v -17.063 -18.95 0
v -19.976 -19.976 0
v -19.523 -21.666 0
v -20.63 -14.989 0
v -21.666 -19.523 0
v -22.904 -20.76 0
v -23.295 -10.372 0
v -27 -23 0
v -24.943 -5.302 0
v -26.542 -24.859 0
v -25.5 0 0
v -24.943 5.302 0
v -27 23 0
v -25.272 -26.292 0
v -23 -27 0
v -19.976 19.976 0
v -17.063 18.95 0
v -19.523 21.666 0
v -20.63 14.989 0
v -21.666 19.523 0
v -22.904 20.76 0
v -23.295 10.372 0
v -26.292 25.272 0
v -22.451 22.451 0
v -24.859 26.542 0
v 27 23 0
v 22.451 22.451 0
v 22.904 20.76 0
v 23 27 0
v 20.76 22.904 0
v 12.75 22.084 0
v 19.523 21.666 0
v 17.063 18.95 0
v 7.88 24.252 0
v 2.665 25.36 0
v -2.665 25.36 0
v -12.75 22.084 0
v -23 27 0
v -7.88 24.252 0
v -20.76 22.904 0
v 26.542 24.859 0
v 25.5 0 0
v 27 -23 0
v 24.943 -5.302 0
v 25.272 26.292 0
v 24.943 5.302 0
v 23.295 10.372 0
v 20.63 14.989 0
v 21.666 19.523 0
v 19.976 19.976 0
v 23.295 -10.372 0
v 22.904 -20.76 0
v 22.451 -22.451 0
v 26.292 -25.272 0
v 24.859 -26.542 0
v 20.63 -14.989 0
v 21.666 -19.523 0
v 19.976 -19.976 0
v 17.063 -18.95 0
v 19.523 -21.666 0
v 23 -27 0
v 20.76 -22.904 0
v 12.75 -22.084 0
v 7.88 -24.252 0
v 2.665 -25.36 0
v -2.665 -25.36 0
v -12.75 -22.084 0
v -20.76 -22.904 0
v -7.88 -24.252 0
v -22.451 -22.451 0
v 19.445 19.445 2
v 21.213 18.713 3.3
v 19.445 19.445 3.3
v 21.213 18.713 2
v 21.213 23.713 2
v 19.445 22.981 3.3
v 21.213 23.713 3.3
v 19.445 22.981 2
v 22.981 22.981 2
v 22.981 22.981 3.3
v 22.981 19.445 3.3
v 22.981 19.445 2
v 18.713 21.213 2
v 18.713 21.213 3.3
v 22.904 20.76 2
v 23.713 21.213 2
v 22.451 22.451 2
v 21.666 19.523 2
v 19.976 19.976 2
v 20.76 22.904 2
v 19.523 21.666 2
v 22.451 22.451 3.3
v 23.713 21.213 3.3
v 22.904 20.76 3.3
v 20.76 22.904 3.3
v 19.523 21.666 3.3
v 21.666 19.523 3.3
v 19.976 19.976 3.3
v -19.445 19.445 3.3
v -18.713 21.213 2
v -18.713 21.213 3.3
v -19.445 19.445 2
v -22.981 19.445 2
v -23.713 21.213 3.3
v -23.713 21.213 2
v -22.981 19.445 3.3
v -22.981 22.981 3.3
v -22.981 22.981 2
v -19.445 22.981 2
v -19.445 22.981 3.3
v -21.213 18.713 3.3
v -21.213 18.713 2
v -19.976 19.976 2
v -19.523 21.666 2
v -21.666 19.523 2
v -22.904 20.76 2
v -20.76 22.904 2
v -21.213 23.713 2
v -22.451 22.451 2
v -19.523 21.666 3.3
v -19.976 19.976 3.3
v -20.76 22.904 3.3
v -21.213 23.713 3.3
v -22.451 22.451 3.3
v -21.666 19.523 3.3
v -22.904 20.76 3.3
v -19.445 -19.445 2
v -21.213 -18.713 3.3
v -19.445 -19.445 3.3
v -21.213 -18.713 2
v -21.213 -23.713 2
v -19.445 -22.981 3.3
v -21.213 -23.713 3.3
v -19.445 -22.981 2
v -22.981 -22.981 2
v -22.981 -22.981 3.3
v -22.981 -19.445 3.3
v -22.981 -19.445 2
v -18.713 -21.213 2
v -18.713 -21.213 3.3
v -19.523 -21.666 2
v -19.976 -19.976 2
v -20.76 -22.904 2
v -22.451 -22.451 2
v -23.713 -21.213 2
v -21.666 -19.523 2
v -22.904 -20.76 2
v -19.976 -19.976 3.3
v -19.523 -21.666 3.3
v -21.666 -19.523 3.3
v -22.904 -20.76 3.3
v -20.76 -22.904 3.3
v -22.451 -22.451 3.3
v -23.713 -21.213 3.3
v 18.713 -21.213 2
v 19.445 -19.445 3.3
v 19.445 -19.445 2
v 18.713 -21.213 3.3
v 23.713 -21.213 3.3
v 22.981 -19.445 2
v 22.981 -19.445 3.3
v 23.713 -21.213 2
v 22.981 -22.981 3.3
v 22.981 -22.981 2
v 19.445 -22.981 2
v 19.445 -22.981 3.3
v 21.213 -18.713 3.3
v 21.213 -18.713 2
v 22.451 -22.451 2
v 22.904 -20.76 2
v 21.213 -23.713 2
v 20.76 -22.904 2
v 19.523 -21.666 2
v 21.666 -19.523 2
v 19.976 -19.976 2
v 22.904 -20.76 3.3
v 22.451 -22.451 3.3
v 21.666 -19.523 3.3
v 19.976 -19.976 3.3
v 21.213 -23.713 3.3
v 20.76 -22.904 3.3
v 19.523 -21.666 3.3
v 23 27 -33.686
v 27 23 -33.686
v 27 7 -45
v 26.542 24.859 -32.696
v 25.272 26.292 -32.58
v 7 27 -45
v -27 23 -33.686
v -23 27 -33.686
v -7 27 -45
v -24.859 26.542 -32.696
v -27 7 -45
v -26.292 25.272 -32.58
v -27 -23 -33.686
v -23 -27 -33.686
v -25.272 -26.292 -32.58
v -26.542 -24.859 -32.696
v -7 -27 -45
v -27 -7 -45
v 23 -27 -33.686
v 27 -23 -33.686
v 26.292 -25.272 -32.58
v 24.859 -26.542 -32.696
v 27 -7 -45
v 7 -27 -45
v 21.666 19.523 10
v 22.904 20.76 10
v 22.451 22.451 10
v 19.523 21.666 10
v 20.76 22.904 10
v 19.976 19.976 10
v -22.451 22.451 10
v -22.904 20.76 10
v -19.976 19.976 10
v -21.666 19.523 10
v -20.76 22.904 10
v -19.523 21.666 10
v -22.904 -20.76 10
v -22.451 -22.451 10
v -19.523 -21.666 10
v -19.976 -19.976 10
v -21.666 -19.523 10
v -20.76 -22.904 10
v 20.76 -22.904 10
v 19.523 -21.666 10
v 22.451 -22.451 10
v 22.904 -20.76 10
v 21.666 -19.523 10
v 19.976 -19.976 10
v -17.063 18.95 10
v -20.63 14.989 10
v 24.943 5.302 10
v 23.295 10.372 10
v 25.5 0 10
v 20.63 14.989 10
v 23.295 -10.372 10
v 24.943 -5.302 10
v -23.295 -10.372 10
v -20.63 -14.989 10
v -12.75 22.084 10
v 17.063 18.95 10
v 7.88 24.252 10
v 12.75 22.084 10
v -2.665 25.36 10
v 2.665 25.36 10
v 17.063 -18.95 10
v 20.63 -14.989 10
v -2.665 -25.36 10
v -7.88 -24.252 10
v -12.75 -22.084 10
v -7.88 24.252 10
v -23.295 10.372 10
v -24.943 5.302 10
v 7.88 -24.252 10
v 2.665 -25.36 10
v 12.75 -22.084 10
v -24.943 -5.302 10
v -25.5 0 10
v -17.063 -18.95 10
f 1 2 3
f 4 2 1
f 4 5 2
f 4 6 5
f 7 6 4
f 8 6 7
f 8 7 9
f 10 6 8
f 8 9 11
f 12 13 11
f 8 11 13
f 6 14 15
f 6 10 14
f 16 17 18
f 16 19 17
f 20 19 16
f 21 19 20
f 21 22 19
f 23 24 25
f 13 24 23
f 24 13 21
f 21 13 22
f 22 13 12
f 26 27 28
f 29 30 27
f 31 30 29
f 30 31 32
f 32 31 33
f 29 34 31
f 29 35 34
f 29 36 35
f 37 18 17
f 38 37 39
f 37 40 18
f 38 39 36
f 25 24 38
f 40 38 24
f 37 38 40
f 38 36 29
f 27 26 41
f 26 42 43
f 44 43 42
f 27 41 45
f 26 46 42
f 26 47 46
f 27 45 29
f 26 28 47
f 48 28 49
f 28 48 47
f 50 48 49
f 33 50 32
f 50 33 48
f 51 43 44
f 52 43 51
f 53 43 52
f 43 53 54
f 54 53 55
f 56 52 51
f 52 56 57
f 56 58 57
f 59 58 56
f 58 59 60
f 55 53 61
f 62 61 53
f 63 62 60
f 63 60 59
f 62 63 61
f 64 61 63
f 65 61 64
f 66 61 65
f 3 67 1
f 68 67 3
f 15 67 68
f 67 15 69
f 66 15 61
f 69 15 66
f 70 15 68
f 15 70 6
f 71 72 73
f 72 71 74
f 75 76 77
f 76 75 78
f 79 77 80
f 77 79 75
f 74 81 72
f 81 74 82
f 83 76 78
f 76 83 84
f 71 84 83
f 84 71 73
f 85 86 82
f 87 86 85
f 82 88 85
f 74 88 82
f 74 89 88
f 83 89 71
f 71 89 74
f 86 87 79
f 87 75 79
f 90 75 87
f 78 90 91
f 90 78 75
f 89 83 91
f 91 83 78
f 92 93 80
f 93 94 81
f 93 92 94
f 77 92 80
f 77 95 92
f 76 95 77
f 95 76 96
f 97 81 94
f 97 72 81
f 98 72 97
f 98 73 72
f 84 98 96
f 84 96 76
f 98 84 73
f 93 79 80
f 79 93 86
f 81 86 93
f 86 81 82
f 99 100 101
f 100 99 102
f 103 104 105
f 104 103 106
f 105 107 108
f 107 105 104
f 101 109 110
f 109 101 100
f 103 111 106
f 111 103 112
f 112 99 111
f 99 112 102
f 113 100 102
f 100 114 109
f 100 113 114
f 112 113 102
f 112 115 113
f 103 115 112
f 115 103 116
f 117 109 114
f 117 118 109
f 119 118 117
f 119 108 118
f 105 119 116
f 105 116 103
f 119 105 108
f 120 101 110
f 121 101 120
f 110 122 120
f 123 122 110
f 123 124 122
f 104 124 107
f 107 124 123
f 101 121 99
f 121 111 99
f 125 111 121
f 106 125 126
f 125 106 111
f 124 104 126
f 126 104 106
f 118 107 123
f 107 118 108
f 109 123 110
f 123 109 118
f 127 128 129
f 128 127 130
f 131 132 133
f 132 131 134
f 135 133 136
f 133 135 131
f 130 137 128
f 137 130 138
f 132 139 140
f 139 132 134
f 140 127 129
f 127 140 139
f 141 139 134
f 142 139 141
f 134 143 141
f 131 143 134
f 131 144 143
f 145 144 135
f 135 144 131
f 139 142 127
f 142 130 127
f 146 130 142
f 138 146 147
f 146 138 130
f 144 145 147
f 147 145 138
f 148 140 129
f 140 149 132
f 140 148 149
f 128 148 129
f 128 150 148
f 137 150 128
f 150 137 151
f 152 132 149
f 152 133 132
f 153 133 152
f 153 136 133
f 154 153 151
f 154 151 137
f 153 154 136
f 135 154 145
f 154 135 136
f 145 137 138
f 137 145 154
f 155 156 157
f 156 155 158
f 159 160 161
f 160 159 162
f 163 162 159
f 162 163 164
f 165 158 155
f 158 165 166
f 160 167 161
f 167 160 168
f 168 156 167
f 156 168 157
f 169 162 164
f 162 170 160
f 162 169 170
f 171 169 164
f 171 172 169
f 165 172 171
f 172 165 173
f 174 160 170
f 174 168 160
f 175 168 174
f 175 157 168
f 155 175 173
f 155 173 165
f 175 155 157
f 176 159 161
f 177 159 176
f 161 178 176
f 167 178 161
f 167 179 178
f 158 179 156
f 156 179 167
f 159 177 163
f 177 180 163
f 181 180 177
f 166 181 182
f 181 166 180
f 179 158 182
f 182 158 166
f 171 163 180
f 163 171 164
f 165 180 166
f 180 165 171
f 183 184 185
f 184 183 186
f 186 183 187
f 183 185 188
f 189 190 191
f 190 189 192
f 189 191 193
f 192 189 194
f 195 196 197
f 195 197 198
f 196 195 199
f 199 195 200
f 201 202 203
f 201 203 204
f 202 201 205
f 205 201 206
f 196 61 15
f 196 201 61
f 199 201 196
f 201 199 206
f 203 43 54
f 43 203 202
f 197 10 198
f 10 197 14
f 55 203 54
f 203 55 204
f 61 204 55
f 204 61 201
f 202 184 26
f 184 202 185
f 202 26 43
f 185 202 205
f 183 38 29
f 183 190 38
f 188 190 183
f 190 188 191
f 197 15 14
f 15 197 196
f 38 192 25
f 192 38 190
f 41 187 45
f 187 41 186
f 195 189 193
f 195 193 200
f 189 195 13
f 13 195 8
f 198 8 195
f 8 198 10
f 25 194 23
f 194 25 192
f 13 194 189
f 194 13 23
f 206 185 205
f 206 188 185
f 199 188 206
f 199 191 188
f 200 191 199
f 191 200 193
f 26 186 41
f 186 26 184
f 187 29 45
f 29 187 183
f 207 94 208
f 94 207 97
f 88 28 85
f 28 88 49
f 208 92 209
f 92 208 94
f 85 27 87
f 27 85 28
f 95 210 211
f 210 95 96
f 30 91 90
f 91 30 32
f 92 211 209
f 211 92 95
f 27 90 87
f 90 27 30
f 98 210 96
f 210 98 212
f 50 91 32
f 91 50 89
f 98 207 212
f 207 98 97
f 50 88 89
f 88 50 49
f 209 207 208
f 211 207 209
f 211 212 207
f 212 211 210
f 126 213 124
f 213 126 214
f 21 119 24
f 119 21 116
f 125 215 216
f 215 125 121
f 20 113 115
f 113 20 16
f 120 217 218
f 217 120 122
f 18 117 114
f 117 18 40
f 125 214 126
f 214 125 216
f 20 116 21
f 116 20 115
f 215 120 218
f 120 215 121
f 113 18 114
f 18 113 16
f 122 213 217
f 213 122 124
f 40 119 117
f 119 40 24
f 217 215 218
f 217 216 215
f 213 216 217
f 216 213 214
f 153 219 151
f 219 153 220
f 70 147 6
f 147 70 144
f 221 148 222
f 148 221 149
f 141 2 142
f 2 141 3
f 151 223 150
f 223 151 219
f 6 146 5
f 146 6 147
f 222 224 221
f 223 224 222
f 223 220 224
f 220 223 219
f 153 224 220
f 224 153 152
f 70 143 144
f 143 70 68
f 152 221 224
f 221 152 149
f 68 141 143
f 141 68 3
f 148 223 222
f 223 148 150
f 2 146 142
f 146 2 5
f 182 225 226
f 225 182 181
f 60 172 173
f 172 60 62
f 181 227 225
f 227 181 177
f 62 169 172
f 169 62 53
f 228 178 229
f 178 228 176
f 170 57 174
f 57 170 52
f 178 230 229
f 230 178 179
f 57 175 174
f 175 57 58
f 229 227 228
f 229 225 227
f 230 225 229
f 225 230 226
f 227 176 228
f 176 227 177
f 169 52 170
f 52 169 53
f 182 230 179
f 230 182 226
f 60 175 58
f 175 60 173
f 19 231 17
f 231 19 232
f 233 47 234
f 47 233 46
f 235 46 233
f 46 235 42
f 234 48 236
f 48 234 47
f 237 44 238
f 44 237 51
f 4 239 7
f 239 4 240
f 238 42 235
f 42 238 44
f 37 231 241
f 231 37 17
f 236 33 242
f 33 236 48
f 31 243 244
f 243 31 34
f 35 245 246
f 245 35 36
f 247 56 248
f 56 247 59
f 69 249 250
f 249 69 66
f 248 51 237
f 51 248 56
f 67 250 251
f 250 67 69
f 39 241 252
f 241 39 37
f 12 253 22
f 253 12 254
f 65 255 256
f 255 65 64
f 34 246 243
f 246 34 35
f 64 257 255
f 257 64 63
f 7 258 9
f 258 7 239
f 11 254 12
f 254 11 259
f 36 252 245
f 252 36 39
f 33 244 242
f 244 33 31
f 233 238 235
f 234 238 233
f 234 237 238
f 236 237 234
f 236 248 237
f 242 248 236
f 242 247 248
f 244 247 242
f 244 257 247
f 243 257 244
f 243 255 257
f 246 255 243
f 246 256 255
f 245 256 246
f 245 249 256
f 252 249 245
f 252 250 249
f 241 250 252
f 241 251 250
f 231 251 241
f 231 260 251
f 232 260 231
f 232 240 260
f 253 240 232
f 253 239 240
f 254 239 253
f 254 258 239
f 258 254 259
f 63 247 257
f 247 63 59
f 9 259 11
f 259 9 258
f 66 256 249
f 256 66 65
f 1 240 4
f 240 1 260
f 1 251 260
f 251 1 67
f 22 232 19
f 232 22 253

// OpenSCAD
// file: screws.scad
module m3_screw(h=6) {
  color([0.7,0.7,0.7]) {
    cylinder(d=5, h=1.3);
    translate([0, 0, -h])
      cylinder(d=2.7, h=h);
  }
}

module m3_bolt(h=2.5) {
  color([0.7,0.7,0.7]) translate([0, 0, -h]) cylinder(d=5, h=h, $fn=6);
}

module m3_washer() {
  color([0.7,0.7,0.7]) translate([0, 0, -0.5/2]) {
    difference() {
      cylinder(d=7, h=0.5, center=true);
      cylinder(d=3.2, h=1, center=true);
    }
  }
}
// file: utils.scad
module rounded_square(size=1, center=false, r=1) {
  offset(r)
    offset(-r)
      square(size, center=center);
}

module chamfered_pocket(size=1, h=1) {
  intersection() {
    hull() {
      translate([0,0,h/2])
        cube([size.x, size.y, h], center=true);

      translate([0,0,1.5*h])
        cube([size.x+h*2, size.y+h*2, h], center=true);
    }
    translate([0,0,0.5*h])
      cube([size.x+h*2, size.y+h*2, h], center=true);
  }
}
// main file
use <utils.scad>
use <screws.scad>

module speaker_holes() {
  for (r=[45:90:360])
    rotate([0,0,r])
      translate([30,0,0])
      children();
}

module speaker(support_thickness=2) {
  difference() {
    union() {
      translate([0, 0, -0.3])
        linear_extrude(0.3)
        rounded_square([53, 53], r=8, center=true);
      translate([0, 0, -17]) cylinder(d1=35, d2=52, h=17);
      translate([0, 0, -28]) cylinder(d=35, h=28);
      color([0.2, 0.2, 0.2]) translate([0, 0, -18 - 8]) cylinder(d=40, h=8);
    }
    translate([0,0,28]) color([0.7,0.7,0.7]) sphere(r=35);
    cylinder(d=47, h=4, center=true);

    // holes
    for (r=[45:90:360]) {
      rotate([0,0,r]) translate([30,0,0]) hull() {
        for (t=[-0.75,0.75])
          translate([t, 0, 0])
            cylinder(d=4.5, h=1, center=true);
      }
    }
  }

  // tore
  color([0.2, 0.2, 0.2])
    translate([0,0,-2])
    rotate_extrude()
    translate([20,0,0])
    rotate([0,0,90])
    circle(d=5.5);

  color([0.2, 0.2, 0.2]) difference() {
    cylinder(d=50, h=3, center=true);
    cylinder(d=47, h=4, center=true);
  }

  speaker_holes() {
    translate([0, 0, support_thickness]) m3_screw();
    translate([0, 0, -0.3]) m3_washer();
    translate([0, 0, -0.3-0.5]) m3_bolt();
  }
}

module speaker_pocket() {
  difference() {
    translate([0,0,-45]) linear_extrude(45) rounded_square([54, 54], r=4, center=true);
    for (r=[45:90:360]) {
      rotate([0,0,r])
        translate([54/2*sqrt(2), 0, -45])
        rotate([0, 45, 0])
        cube([20,40,20], center=true);
    }
  }
  cylinder(d=51, h=20, center=true);
  speaker_holes() cylinder(d=3.5, h=20, center=true);
}

speaker();
#speaker_pocket();
